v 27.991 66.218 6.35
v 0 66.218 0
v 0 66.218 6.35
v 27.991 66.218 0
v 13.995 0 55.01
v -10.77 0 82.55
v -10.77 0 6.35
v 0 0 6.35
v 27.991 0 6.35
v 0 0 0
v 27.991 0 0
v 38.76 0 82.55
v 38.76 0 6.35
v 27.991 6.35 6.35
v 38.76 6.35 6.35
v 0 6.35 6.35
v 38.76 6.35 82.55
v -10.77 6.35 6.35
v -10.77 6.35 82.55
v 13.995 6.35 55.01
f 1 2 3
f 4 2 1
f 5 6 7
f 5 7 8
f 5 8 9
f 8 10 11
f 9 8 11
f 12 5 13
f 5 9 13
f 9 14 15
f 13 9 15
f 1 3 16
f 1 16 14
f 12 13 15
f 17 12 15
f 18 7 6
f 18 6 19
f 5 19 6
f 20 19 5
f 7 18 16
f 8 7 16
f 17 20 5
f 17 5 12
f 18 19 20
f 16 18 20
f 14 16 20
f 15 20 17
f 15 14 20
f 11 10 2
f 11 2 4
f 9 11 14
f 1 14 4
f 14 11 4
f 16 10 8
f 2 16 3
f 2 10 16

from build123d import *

# Parameters (mm, degrees)
SKETCH1_W           = 27.9908
SKETCH1_H           = 66.2178
BOSS_EXTRUDE1_DEPTH = 6.35
SKETCH4_W           = 49.53
SKETCH4_H           = 6.35
BOSS_EXTRUDE3_DEPTH = 76.2
CUT_EXTRUDE1_DEPTH  = 110.091817223


with BuildPart() as part:
    # Sketch1 → Boss-Extrude1 (new body)
    with BuildSketch(Plane.XY):
        with Locations((13.9954, 33.1089)):
            Rectangle(SKETCH1_W, SKETCH1_H)
    extrude(amount=BOSS_EXTRUDE1_DEPTH)

    # Sketch4 → Boss-Extrude3 (add)
    with BuildSketch(Plane.XY.offset(6.35)):
        with Locations((13.9954, 3.175)):
            Rectangle(SKETCH4_W, SKETCH4_H)
    extrude(amount=BOSS_EXTRUDE3_DEPTH)

    # Sketch5 → Cut-Extrude1 (cut, through all)
    with BuildSketch(Plane(origin=(0, 6.35, 0), x_dir=(1, 0, 0), z_dir=(0, 1, 0))):
        Polygon((-10.7696, -82.55), (13.9954, -55.009603144), (38.7604, -82.55), align=None)
    extrude(amount=-CUT_EXTRUDE1_DEPTH, mode=Mode.SUBTRACT)


solid = part.part
